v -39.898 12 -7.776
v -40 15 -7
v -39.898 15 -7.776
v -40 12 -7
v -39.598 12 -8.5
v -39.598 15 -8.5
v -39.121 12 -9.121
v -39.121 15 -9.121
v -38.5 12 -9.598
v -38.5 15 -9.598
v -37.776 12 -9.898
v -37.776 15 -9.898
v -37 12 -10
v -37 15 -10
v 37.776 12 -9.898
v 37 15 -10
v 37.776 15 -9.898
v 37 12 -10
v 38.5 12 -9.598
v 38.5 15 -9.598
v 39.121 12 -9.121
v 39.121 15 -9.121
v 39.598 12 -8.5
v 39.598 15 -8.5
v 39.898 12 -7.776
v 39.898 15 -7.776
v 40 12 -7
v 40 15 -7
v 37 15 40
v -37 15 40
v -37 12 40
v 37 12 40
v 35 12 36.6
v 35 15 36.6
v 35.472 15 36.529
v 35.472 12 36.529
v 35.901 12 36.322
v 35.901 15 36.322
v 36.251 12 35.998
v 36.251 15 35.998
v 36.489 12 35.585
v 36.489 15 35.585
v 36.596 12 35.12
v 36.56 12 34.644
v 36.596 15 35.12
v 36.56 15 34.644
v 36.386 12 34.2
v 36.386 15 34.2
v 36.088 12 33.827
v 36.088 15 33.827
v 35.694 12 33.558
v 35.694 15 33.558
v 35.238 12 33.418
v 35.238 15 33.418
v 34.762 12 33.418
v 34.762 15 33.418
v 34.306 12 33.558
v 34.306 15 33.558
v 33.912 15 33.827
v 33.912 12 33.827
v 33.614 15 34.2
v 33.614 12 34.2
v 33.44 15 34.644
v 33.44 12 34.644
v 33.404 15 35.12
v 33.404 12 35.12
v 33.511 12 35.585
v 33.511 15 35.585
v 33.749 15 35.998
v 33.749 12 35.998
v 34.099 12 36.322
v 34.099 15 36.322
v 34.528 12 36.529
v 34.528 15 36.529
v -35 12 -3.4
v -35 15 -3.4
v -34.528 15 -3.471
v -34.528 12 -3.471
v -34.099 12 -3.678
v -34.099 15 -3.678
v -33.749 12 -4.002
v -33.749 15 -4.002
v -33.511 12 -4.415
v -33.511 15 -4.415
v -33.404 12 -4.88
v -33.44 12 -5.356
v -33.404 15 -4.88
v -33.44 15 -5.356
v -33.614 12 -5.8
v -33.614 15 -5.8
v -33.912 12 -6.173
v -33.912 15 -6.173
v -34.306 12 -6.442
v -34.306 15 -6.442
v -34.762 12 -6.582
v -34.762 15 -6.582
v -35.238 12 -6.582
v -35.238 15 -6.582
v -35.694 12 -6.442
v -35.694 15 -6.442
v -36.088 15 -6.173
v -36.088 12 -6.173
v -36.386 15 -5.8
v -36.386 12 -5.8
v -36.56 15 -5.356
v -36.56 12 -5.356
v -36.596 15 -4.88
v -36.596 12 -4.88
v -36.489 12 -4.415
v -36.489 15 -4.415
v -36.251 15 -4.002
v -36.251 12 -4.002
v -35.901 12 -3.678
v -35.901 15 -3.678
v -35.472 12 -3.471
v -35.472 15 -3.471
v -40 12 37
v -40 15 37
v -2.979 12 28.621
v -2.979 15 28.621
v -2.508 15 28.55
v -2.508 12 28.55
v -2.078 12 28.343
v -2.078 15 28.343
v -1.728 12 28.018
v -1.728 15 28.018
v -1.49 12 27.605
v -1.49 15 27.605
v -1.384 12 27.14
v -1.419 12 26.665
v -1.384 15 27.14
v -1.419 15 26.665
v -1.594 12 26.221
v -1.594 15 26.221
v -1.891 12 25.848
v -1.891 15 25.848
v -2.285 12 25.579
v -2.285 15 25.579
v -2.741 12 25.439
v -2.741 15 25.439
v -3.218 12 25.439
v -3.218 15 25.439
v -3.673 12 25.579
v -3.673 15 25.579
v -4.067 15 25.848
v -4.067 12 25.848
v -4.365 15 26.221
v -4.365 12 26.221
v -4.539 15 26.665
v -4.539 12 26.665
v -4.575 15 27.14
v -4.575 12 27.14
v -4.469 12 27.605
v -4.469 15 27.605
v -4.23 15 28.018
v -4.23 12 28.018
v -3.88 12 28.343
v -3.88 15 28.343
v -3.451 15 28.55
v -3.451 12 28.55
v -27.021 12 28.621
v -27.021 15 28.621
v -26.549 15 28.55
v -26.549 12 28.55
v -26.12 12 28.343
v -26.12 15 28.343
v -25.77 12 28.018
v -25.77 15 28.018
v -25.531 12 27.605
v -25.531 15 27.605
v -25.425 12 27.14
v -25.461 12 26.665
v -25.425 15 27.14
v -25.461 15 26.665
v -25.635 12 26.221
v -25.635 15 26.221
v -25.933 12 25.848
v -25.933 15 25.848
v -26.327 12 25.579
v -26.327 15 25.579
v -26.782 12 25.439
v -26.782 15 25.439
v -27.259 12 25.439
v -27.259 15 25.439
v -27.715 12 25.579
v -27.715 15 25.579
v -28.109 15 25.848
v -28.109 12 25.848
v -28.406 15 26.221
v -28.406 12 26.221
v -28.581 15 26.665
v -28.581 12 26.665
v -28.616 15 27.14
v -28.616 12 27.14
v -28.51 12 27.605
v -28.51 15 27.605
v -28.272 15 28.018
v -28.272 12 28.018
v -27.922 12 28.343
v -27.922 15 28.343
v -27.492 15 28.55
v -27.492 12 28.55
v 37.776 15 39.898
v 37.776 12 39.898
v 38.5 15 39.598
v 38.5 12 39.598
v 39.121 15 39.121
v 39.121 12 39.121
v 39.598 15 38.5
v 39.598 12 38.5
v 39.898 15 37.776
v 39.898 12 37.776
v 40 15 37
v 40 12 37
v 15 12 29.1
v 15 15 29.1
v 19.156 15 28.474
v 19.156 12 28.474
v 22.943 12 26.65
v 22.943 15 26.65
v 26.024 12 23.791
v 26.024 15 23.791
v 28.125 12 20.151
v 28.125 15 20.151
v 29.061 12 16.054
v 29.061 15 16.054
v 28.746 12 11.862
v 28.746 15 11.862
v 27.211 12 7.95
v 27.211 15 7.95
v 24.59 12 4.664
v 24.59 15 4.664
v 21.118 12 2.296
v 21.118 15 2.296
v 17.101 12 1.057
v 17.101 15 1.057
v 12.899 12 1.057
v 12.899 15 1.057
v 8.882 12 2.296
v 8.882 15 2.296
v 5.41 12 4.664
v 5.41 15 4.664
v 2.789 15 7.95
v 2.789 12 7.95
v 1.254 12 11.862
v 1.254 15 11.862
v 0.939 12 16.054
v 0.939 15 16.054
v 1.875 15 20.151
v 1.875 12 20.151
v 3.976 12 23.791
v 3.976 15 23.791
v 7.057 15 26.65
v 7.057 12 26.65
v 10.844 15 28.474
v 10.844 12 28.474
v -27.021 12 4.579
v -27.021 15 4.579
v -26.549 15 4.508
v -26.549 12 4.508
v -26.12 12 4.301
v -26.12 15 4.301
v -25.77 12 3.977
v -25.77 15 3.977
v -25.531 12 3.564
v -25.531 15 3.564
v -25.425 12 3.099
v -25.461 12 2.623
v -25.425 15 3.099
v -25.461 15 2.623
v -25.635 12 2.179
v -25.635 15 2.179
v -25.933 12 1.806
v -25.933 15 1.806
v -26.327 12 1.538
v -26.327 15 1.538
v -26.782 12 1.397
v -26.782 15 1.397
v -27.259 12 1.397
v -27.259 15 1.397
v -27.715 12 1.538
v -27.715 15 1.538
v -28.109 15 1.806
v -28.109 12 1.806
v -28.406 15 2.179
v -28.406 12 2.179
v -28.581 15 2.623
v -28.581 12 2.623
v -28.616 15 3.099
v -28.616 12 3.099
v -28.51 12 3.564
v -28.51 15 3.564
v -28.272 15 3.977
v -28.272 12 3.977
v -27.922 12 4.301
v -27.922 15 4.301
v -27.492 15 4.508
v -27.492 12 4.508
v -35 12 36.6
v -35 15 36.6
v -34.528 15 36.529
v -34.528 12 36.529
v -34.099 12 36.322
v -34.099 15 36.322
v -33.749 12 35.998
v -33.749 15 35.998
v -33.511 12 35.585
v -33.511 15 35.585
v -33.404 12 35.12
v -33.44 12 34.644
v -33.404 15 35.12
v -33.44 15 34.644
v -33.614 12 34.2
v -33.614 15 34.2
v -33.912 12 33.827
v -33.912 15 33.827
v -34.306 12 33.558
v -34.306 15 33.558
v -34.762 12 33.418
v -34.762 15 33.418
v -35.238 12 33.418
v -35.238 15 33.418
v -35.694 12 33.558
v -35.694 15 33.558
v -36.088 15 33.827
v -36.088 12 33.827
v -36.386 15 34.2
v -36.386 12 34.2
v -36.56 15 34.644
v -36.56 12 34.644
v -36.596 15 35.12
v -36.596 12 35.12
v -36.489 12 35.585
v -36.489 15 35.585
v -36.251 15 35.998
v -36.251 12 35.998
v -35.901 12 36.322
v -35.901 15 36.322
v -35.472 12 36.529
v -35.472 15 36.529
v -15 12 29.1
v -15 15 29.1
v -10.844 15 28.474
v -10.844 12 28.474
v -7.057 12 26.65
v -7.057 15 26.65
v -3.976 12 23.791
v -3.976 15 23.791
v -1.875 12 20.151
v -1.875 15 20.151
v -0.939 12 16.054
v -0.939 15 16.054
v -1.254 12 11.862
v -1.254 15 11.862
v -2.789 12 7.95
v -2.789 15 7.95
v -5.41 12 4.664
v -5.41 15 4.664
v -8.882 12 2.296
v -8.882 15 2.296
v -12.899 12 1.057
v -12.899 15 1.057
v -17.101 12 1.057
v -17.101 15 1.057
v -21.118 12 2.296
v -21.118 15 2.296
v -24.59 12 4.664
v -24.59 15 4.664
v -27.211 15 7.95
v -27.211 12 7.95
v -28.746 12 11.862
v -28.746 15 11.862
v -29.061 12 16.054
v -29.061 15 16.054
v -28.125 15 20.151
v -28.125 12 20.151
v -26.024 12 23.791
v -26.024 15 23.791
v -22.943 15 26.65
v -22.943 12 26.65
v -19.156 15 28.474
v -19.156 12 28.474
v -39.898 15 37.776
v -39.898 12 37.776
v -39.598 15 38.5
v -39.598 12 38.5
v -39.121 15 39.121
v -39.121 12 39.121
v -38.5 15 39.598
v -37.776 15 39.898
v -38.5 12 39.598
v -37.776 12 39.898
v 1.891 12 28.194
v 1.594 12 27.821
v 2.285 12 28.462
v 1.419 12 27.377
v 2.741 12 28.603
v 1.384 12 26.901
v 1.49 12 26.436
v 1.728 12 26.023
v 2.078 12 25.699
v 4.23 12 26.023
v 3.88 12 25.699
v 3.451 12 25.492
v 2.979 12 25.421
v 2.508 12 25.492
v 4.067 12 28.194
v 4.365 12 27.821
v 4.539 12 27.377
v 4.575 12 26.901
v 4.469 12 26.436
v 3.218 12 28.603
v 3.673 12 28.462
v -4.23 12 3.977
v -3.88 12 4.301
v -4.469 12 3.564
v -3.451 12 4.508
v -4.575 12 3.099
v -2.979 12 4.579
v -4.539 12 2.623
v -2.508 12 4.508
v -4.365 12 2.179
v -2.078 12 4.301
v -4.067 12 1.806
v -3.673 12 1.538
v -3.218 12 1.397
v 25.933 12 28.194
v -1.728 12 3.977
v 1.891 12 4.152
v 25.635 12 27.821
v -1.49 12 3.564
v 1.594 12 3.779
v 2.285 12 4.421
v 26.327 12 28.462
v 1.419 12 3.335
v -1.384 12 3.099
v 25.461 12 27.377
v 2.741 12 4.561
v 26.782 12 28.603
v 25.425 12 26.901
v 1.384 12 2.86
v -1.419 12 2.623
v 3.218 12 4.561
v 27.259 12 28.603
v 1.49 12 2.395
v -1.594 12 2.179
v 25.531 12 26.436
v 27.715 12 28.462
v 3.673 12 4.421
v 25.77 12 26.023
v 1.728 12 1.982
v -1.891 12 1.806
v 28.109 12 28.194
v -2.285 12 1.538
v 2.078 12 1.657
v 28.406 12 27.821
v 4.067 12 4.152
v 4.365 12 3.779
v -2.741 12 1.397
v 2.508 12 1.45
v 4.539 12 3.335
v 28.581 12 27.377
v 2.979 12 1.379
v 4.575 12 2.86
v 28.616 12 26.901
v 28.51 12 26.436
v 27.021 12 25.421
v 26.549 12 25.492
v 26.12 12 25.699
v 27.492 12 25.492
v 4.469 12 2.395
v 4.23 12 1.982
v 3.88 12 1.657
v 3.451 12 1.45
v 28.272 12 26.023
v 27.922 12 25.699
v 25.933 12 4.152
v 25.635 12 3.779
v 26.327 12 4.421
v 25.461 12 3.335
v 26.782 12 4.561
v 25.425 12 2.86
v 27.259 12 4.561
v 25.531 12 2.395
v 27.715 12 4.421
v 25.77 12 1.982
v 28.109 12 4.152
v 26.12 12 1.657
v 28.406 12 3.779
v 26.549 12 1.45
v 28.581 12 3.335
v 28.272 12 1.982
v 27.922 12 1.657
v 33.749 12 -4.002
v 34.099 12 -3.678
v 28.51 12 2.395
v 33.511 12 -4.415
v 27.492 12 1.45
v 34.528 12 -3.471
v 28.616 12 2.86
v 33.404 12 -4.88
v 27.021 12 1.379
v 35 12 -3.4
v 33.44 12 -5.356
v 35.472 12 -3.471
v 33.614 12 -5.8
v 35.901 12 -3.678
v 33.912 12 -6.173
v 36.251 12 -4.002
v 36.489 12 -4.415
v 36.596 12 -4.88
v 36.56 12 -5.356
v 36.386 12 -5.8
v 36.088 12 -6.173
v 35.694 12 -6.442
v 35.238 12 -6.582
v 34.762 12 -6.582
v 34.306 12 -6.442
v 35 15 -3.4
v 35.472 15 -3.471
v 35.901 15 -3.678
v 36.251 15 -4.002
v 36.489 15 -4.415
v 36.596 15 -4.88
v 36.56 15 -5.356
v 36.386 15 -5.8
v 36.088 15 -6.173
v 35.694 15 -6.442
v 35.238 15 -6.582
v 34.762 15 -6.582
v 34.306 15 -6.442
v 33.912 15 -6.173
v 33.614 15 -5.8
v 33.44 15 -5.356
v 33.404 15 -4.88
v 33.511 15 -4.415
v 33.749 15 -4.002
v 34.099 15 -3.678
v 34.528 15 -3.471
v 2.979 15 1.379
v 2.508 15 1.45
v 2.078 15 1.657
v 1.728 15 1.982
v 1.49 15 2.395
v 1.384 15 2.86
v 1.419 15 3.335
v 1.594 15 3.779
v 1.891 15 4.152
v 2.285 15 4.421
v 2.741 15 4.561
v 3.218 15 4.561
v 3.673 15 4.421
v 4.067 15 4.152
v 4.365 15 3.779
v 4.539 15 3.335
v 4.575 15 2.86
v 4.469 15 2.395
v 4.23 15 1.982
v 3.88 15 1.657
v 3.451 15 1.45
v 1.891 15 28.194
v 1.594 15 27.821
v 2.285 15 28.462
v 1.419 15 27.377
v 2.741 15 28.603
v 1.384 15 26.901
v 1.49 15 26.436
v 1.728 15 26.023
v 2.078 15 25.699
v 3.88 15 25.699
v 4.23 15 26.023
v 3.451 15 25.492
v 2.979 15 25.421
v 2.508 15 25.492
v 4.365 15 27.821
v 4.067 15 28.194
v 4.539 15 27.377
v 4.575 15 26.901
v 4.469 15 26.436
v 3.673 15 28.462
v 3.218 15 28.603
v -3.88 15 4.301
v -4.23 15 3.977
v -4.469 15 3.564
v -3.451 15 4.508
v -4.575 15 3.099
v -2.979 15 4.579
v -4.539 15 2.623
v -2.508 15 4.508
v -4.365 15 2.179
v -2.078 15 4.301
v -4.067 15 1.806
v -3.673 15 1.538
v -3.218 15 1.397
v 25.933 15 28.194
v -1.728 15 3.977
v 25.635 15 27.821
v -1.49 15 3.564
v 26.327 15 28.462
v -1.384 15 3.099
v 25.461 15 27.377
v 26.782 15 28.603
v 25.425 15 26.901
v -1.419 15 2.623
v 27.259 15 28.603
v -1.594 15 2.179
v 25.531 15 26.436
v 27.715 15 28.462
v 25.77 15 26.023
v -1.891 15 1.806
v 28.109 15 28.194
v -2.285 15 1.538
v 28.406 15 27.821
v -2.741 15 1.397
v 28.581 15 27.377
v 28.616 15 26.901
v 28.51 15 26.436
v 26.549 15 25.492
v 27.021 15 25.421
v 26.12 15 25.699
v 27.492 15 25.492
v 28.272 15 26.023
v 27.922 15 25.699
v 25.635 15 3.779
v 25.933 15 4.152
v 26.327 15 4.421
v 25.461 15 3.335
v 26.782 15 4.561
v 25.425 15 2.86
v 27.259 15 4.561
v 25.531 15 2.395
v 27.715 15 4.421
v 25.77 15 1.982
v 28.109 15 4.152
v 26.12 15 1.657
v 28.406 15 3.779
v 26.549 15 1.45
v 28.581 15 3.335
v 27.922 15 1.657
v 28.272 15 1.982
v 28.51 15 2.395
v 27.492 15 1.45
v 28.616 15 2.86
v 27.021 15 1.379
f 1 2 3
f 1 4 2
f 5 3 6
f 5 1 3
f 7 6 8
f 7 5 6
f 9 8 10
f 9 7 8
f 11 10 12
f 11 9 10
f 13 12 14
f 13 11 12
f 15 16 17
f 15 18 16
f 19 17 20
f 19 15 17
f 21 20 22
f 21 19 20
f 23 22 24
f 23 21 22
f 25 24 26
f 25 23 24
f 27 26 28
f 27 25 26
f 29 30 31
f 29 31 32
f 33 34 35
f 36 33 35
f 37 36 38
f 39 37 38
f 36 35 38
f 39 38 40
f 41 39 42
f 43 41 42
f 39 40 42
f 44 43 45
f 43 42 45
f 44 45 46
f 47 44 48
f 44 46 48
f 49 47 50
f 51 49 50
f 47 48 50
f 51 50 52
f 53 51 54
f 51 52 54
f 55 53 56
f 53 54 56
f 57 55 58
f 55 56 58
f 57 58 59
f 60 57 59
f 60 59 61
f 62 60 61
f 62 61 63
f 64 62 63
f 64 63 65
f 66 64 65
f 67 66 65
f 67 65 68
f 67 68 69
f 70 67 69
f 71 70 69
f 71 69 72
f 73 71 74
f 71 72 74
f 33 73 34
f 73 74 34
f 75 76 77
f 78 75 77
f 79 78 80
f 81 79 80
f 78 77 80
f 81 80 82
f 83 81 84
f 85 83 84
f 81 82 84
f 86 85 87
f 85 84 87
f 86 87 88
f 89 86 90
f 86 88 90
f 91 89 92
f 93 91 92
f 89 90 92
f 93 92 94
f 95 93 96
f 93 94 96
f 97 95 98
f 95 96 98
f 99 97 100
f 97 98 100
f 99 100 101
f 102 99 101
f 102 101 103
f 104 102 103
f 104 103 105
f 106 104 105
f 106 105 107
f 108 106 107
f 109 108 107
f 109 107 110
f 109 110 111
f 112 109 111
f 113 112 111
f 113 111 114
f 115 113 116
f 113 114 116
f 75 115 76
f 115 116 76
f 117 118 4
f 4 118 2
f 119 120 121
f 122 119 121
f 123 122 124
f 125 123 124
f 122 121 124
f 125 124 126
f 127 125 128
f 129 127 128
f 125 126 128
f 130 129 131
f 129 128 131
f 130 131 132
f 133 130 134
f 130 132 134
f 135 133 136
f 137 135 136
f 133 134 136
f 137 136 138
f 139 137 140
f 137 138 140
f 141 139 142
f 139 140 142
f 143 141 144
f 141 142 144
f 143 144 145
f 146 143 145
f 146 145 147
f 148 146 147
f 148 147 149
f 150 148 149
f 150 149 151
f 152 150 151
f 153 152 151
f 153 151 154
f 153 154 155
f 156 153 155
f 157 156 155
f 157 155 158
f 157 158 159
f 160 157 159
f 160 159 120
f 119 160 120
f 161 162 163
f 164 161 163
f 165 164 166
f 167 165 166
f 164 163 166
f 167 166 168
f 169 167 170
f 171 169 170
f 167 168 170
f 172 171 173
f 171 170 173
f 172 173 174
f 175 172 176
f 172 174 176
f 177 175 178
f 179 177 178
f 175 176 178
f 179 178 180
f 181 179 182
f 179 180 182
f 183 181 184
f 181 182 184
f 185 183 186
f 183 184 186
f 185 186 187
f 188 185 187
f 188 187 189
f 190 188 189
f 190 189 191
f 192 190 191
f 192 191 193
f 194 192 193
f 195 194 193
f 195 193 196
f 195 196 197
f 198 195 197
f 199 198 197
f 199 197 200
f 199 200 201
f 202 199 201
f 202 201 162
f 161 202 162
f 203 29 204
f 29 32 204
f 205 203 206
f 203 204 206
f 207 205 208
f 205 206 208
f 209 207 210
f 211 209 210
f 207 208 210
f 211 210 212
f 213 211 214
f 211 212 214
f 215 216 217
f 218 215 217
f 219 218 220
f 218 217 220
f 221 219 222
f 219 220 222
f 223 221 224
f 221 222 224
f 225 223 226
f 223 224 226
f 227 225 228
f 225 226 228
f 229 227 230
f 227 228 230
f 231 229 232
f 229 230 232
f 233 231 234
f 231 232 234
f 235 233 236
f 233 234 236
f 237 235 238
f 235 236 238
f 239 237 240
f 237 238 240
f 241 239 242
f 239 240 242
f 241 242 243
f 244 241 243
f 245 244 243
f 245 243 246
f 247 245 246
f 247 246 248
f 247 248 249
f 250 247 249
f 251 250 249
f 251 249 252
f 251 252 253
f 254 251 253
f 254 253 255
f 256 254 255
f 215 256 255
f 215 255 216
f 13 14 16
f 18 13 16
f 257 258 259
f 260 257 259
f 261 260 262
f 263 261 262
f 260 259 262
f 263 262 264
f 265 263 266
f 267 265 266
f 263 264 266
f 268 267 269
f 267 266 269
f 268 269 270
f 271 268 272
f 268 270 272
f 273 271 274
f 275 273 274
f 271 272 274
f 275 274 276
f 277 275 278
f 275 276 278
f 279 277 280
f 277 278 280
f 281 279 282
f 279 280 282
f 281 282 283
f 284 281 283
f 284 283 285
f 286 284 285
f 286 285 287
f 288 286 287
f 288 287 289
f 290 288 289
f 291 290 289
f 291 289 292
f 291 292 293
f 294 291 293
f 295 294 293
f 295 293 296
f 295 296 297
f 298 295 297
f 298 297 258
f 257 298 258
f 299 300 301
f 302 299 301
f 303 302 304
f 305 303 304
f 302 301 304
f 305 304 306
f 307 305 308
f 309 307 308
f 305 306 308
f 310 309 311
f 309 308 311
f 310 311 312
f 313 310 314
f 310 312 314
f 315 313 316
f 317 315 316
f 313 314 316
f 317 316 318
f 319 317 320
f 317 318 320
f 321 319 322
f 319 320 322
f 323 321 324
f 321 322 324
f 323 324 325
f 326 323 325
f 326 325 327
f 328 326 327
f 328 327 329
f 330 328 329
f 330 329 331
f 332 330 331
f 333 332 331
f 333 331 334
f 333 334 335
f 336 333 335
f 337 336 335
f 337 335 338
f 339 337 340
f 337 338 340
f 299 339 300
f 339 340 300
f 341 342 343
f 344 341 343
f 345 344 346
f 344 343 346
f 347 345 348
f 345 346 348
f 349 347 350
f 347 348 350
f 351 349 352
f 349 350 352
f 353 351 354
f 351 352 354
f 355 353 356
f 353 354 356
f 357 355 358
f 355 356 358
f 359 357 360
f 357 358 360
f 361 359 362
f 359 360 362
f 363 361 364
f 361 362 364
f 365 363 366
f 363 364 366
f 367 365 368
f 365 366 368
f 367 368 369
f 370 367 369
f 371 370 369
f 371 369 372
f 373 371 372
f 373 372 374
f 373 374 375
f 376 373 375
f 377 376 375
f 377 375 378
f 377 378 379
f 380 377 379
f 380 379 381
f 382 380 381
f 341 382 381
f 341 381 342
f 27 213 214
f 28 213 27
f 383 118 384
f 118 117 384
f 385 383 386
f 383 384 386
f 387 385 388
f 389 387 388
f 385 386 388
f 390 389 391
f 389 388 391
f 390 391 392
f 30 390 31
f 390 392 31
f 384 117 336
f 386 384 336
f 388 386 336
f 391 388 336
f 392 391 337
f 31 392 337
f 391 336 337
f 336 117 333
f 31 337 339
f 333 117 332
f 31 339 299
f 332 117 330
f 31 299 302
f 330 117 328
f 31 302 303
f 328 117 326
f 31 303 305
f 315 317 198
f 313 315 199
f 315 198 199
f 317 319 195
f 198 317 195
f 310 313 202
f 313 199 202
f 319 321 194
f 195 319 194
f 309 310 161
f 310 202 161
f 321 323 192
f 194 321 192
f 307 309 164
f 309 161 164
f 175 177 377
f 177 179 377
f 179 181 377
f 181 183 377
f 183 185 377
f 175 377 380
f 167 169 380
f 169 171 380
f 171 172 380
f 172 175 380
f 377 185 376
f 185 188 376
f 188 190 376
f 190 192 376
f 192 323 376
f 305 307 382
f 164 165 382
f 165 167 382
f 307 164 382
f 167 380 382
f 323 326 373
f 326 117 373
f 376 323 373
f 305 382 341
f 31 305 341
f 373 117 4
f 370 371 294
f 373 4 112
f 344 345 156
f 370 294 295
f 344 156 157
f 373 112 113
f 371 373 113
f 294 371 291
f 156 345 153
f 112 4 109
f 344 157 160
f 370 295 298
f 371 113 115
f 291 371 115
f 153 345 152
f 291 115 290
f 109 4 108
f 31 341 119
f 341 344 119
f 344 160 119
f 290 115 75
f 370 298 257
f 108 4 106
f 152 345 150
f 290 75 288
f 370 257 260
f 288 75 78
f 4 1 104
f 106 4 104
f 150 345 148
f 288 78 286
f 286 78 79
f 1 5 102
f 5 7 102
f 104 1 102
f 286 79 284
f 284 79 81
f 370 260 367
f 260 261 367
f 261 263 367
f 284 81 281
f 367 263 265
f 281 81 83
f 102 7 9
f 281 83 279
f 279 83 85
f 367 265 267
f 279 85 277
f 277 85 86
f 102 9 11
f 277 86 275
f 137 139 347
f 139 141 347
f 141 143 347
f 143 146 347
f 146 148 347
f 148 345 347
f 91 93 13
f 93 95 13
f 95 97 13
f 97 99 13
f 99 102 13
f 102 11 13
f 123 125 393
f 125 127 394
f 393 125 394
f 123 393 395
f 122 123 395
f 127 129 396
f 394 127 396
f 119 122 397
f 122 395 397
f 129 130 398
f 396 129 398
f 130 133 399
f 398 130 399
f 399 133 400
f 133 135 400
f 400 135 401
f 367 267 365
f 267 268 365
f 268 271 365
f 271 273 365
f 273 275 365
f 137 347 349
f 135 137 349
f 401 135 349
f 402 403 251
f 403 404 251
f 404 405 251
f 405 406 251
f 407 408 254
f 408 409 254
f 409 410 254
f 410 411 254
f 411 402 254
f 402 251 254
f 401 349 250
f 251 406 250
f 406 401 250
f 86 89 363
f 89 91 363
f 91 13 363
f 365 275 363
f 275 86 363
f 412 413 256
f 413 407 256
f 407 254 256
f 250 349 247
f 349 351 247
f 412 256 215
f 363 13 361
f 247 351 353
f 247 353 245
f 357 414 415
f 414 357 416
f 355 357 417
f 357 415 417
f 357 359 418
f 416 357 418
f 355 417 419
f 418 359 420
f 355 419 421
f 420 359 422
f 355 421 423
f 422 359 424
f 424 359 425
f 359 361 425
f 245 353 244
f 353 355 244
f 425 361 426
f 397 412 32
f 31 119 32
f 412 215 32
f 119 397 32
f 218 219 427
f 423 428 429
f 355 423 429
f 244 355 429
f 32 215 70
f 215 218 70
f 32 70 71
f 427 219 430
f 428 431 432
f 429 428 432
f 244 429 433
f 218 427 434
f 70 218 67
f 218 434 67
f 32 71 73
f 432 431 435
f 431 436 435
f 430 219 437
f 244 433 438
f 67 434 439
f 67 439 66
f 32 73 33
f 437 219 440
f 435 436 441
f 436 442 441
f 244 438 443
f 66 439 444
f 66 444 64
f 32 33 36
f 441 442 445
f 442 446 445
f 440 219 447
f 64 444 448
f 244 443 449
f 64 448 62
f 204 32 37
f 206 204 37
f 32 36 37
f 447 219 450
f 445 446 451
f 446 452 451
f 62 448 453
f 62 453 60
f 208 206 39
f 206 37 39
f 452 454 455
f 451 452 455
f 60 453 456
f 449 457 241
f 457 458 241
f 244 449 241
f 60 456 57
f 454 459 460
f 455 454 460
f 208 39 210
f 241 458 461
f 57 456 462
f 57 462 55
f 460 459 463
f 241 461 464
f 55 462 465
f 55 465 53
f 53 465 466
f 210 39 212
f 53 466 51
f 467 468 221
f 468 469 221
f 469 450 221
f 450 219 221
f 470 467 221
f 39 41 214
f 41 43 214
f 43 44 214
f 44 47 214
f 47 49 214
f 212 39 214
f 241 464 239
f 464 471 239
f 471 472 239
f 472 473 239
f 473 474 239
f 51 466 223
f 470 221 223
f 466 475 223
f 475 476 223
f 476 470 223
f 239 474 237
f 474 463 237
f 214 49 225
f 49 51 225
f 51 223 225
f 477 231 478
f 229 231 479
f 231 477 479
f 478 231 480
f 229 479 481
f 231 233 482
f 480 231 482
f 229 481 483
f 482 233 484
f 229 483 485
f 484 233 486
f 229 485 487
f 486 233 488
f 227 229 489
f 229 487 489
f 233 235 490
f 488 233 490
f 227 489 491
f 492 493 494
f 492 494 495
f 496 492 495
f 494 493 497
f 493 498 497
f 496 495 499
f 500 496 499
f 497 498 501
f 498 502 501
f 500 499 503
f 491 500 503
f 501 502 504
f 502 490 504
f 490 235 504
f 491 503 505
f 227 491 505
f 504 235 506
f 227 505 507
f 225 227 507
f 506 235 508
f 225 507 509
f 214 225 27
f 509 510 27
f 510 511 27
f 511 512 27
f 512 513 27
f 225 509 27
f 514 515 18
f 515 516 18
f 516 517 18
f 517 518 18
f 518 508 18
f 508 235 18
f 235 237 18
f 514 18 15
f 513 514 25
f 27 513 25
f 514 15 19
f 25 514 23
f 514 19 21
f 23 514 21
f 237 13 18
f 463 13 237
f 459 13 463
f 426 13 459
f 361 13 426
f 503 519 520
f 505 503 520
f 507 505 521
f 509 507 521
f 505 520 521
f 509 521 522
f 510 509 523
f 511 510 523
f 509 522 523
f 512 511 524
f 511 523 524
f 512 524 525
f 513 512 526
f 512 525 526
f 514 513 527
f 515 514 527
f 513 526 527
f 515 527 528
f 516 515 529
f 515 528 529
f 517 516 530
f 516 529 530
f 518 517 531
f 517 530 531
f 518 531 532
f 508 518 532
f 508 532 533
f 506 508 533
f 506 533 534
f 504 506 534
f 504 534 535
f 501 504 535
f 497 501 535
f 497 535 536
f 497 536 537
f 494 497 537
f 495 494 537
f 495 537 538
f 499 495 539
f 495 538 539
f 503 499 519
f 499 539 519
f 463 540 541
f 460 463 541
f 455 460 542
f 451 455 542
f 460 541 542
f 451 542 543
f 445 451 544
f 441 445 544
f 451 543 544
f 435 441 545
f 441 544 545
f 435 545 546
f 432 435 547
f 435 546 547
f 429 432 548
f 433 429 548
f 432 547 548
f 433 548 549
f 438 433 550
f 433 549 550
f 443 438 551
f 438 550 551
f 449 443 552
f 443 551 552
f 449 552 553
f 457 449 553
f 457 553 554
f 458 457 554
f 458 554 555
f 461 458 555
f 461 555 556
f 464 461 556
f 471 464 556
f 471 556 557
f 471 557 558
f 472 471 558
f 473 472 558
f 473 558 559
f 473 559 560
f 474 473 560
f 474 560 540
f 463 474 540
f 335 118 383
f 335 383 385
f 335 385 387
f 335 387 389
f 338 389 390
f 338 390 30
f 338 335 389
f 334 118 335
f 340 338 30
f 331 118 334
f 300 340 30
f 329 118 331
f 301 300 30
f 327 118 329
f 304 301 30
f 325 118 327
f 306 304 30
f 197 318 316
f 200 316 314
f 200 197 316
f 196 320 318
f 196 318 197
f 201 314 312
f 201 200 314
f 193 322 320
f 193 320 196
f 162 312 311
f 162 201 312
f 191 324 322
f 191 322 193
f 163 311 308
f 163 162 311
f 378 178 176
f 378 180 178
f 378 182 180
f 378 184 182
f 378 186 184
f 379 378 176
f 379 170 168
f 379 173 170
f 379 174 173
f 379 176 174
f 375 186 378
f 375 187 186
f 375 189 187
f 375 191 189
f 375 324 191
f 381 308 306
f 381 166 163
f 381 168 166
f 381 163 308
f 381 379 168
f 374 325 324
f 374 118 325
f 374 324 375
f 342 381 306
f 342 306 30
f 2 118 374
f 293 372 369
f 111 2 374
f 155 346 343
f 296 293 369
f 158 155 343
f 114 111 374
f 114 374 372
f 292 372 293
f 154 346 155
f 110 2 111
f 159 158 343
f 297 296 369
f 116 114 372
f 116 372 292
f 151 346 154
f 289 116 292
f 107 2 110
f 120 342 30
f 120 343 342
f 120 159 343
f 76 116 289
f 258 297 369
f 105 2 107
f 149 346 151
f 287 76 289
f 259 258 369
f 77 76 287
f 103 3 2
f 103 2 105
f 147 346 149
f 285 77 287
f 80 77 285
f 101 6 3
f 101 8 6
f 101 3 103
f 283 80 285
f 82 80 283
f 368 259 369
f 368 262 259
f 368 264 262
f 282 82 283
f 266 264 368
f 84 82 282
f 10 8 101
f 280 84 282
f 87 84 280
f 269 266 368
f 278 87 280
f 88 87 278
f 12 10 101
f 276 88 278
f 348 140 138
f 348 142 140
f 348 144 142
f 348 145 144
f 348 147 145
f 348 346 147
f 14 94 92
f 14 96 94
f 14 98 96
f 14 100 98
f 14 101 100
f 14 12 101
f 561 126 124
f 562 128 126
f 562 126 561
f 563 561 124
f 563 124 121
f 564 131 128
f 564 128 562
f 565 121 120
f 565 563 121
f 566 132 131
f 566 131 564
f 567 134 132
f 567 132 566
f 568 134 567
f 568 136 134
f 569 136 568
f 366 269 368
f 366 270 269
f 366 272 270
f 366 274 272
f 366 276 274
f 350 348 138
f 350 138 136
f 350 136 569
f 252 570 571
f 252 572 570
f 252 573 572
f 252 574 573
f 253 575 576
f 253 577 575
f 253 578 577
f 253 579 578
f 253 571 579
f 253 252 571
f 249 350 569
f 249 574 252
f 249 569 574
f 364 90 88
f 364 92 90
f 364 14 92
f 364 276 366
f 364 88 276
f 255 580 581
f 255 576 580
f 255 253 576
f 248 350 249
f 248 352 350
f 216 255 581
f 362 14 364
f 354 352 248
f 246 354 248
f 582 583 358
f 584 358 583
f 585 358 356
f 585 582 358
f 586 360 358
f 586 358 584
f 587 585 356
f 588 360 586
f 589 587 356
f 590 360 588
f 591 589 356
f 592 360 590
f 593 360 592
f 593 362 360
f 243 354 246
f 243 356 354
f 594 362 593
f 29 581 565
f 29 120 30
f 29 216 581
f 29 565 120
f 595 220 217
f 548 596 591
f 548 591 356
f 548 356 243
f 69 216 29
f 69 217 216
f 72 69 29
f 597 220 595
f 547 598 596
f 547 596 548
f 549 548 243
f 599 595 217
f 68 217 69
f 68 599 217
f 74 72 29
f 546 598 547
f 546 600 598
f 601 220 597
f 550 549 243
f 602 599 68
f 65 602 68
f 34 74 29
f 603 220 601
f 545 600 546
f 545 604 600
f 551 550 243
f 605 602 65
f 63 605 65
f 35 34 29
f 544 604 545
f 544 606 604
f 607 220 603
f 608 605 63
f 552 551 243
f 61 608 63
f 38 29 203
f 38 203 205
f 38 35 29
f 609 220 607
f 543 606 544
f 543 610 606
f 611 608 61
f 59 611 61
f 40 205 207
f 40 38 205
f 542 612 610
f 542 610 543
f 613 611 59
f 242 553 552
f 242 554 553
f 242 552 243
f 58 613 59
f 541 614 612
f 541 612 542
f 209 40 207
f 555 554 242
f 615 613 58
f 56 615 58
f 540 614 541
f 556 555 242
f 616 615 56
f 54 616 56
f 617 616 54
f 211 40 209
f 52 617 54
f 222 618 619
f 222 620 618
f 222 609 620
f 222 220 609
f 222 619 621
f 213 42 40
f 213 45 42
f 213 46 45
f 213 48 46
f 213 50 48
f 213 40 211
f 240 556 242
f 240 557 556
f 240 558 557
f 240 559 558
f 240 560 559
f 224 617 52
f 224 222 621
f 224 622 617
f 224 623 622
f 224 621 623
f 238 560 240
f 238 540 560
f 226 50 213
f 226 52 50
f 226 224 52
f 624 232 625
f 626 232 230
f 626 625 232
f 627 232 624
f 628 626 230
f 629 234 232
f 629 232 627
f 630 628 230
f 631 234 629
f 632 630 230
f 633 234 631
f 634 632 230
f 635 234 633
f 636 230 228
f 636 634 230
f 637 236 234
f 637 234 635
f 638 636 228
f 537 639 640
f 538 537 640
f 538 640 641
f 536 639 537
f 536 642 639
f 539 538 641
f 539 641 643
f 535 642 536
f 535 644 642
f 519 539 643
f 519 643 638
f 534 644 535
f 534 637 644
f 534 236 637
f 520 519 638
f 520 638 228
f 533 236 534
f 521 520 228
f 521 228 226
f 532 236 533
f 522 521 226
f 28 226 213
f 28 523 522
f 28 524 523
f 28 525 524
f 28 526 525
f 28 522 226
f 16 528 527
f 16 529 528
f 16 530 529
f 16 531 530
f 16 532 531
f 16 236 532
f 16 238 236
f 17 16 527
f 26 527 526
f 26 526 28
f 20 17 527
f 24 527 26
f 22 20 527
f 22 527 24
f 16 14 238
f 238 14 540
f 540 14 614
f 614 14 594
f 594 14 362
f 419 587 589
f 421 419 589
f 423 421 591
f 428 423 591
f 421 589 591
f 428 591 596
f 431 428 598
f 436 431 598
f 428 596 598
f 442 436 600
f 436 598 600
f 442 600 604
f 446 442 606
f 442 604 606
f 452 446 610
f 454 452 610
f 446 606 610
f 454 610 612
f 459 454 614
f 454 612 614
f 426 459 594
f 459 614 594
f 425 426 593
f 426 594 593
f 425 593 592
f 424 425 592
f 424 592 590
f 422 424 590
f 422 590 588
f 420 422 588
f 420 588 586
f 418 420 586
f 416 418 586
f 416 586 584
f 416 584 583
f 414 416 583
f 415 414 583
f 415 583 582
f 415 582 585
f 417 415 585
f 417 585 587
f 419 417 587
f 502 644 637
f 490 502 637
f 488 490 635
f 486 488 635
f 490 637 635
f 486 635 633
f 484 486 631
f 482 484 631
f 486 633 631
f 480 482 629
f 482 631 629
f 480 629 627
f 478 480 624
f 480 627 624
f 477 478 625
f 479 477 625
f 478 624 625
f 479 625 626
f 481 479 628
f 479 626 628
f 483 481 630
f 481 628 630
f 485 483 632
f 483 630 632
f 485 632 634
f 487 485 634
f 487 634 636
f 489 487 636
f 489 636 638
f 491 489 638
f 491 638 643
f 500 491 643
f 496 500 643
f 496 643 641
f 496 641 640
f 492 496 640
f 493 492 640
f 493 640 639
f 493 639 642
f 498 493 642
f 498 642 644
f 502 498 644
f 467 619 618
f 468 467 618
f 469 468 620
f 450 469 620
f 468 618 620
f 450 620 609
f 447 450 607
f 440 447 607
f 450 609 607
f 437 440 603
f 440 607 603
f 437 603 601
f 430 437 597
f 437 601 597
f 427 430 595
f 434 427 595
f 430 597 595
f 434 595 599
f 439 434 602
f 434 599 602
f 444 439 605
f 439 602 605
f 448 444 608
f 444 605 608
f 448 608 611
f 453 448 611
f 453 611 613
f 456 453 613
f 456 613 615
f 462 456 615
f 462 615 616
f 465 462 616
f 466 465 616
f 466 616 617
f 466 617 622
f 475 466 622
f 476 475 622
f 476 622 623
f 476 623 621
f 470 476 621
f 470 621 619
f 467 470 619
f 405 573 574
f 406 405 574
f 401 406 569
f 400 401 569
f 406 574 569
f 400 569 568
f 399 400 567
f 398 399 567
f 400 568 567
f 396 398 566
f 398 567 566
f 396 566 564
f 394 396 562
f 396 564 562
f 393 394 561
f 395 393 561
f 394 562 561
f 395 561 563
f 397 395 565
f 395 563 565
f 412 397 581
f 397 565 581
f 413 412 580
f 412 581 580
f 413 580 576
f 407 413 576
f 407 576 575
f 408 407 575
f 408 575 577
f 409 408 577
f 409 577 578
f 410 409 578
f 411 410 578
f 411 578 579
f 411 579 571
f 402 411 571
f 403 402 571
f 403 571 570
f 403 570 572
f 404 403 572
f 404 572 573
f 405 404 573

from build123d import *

# Parameters (mm, degrees)
SKETCH_1_W          = 60
SKETCH_1_H          = 30
EXTRUDE_1_DEPTH     = 30
SKETCH_2_W          = 60
SKETCH_2_H          = 30
CUT_EXTRUDE_1_DEPTH = 27
SKETCH_3_R          = 1.6
SKETCH_3_R_2        = 14.1
CUT_EXTRUDE_2_DEPTH = 43.532340636
SKETCH_4_W          = 80
SKETCH_4_H          = 50
SKETCH_4_W_2        = 60
SKETCH_4_H_2        = 30
EXTRUDE_2_DEPTH     = 3
SKETCH_5_R          = 1.6
CUT_EXTRUDE_3_DEPTH = 3
FILLET_1_R          = 3


with BuildPart() as part:
    # 草图1 → 凸台-拉伸1 (new body)
    with BuildSketch(Plane.XY):
        Rectangle(SKETCH_1_W, SKETCH_1_H)
    extrude(amount=EXTRUDE_1_DEPTH)

    # 草图2 → 切除-拉伸1 (cut)
    with BuildSketch(Plane.XZ.offset(15)):
        with Locations((0, 15)):
            Rectangle(SKETCH_2_W, SKETCH_2_H)
    extrude(amount=-CUT_EXTRUDE_1_DEPTH, mode=Mode.SUBTRACT)

    # 草图3 → 切除-拉伸2 (cut, through all)
    with BuildSketch(Plane(origin=(0, 15, 0), x_dir=(1, 0, 0), z_dir=(0, 1, 0))):
        with Locations(Location((-27.02081528, -2.97918472, 0), (0, 0, 270))):
            Circle(SKETCH_3_R)
        with Locations(Location((-2.97918472, -2.97918472, 0), (0, 0, 270))):
            Circle(SKETCH_3_R)
        with Locations(Location((-2.97918472, -27.02081528, 0), (0, 0, 270))):
            Circle(SKETCH_3_R)
        with Locations(Location((-27.02081528, -27.02081528, 0), (0, 0, 270))):
            Circle(SKETCH_3_R)
        with Locations(Location((27.02081528, -27.02081528, 0), (0, 0, 90))):
            Circle(SKETCH_3_R)
        with Locations(Location((2.97918472, -27.02081528, 0), (0, 0, 90))):
            Circle(SKETCH_3_R)
        with Locations(Location((2.97918472, -2.97918472, 0), (0, 0, 90))):
            Circle(SKETCH_3_R)
        with Locations(Location((27.02081528, -2.97918472, 0), (0, 0, 90))):
            Circle(SKETCH_3_R)
        with Locations(Location((-15, -15, 0), (0, 0, 270))):
            Circle(SKETCH_3_R_2)
        with Locations(Location((15, -15, 0), (0, 0, 270))):
            Circle(SKETCH_3_R_2)
    extrude(amount=-CUT_EXTRUDE_2_DEPTH, mode=Mode.SUBTRACT)

    # 草图4 → 凸台-拉伸2 (add)
    with BuildSketch(Plane(origin=(0, 15, 0), x_dir=(1, 0, 0), z_dir=(0, 1, 0))):
        with Locations((0, -15)):
            Rectangle(SKETCH_4_W, SKETCH_4_H)
        with Locations((0, -15)):
            Rectangle(SKETCH_4_W_2, SKETCH_4_H_2, mode=Mode.SUBTRACT)
    extrude(amount=-EXTRUDE_2_DEPTH)

    # 草图5 → 切除-拉伸3 (cut)
    with BuildSketch(Plane(origin=(0, 15, 0), x_dir=(1, 0, 0), z_dir=(0, 1, 0))):
        with Locations(Location((-35, 5, 0), (0, 0, 270))):
            Circle(SKETCH_5_R)
        with Locations(Location((35, 5, 0), (0, 0, 270))):
            Circle(SKETCH_5_R)
        with Locations(Location((35, -35, 0), (0, 0, 270))):
            Circle(SKETCH_5_R)
        with Locations(Location((-35, -35, 0), (0, 0, 270))):
            Circle(SKETCH_5_R)
    extrude(amount=-CUT_EXTRUDE_3_DEPTH, mode=Mode.SUBTRACT)

    # 圆角1
    fillet_1_edges = [part.edges().sort_by_distance(p)[0] for p in [
        (40, 13.5, -10),
        (40, 13.5, 40),
        (-40, 13.5, 40),
        (-40, 13.5, -10),
    ]]
    fillet(fillet_1_edges, radius=FILLET_1_R)


solid = part.part
